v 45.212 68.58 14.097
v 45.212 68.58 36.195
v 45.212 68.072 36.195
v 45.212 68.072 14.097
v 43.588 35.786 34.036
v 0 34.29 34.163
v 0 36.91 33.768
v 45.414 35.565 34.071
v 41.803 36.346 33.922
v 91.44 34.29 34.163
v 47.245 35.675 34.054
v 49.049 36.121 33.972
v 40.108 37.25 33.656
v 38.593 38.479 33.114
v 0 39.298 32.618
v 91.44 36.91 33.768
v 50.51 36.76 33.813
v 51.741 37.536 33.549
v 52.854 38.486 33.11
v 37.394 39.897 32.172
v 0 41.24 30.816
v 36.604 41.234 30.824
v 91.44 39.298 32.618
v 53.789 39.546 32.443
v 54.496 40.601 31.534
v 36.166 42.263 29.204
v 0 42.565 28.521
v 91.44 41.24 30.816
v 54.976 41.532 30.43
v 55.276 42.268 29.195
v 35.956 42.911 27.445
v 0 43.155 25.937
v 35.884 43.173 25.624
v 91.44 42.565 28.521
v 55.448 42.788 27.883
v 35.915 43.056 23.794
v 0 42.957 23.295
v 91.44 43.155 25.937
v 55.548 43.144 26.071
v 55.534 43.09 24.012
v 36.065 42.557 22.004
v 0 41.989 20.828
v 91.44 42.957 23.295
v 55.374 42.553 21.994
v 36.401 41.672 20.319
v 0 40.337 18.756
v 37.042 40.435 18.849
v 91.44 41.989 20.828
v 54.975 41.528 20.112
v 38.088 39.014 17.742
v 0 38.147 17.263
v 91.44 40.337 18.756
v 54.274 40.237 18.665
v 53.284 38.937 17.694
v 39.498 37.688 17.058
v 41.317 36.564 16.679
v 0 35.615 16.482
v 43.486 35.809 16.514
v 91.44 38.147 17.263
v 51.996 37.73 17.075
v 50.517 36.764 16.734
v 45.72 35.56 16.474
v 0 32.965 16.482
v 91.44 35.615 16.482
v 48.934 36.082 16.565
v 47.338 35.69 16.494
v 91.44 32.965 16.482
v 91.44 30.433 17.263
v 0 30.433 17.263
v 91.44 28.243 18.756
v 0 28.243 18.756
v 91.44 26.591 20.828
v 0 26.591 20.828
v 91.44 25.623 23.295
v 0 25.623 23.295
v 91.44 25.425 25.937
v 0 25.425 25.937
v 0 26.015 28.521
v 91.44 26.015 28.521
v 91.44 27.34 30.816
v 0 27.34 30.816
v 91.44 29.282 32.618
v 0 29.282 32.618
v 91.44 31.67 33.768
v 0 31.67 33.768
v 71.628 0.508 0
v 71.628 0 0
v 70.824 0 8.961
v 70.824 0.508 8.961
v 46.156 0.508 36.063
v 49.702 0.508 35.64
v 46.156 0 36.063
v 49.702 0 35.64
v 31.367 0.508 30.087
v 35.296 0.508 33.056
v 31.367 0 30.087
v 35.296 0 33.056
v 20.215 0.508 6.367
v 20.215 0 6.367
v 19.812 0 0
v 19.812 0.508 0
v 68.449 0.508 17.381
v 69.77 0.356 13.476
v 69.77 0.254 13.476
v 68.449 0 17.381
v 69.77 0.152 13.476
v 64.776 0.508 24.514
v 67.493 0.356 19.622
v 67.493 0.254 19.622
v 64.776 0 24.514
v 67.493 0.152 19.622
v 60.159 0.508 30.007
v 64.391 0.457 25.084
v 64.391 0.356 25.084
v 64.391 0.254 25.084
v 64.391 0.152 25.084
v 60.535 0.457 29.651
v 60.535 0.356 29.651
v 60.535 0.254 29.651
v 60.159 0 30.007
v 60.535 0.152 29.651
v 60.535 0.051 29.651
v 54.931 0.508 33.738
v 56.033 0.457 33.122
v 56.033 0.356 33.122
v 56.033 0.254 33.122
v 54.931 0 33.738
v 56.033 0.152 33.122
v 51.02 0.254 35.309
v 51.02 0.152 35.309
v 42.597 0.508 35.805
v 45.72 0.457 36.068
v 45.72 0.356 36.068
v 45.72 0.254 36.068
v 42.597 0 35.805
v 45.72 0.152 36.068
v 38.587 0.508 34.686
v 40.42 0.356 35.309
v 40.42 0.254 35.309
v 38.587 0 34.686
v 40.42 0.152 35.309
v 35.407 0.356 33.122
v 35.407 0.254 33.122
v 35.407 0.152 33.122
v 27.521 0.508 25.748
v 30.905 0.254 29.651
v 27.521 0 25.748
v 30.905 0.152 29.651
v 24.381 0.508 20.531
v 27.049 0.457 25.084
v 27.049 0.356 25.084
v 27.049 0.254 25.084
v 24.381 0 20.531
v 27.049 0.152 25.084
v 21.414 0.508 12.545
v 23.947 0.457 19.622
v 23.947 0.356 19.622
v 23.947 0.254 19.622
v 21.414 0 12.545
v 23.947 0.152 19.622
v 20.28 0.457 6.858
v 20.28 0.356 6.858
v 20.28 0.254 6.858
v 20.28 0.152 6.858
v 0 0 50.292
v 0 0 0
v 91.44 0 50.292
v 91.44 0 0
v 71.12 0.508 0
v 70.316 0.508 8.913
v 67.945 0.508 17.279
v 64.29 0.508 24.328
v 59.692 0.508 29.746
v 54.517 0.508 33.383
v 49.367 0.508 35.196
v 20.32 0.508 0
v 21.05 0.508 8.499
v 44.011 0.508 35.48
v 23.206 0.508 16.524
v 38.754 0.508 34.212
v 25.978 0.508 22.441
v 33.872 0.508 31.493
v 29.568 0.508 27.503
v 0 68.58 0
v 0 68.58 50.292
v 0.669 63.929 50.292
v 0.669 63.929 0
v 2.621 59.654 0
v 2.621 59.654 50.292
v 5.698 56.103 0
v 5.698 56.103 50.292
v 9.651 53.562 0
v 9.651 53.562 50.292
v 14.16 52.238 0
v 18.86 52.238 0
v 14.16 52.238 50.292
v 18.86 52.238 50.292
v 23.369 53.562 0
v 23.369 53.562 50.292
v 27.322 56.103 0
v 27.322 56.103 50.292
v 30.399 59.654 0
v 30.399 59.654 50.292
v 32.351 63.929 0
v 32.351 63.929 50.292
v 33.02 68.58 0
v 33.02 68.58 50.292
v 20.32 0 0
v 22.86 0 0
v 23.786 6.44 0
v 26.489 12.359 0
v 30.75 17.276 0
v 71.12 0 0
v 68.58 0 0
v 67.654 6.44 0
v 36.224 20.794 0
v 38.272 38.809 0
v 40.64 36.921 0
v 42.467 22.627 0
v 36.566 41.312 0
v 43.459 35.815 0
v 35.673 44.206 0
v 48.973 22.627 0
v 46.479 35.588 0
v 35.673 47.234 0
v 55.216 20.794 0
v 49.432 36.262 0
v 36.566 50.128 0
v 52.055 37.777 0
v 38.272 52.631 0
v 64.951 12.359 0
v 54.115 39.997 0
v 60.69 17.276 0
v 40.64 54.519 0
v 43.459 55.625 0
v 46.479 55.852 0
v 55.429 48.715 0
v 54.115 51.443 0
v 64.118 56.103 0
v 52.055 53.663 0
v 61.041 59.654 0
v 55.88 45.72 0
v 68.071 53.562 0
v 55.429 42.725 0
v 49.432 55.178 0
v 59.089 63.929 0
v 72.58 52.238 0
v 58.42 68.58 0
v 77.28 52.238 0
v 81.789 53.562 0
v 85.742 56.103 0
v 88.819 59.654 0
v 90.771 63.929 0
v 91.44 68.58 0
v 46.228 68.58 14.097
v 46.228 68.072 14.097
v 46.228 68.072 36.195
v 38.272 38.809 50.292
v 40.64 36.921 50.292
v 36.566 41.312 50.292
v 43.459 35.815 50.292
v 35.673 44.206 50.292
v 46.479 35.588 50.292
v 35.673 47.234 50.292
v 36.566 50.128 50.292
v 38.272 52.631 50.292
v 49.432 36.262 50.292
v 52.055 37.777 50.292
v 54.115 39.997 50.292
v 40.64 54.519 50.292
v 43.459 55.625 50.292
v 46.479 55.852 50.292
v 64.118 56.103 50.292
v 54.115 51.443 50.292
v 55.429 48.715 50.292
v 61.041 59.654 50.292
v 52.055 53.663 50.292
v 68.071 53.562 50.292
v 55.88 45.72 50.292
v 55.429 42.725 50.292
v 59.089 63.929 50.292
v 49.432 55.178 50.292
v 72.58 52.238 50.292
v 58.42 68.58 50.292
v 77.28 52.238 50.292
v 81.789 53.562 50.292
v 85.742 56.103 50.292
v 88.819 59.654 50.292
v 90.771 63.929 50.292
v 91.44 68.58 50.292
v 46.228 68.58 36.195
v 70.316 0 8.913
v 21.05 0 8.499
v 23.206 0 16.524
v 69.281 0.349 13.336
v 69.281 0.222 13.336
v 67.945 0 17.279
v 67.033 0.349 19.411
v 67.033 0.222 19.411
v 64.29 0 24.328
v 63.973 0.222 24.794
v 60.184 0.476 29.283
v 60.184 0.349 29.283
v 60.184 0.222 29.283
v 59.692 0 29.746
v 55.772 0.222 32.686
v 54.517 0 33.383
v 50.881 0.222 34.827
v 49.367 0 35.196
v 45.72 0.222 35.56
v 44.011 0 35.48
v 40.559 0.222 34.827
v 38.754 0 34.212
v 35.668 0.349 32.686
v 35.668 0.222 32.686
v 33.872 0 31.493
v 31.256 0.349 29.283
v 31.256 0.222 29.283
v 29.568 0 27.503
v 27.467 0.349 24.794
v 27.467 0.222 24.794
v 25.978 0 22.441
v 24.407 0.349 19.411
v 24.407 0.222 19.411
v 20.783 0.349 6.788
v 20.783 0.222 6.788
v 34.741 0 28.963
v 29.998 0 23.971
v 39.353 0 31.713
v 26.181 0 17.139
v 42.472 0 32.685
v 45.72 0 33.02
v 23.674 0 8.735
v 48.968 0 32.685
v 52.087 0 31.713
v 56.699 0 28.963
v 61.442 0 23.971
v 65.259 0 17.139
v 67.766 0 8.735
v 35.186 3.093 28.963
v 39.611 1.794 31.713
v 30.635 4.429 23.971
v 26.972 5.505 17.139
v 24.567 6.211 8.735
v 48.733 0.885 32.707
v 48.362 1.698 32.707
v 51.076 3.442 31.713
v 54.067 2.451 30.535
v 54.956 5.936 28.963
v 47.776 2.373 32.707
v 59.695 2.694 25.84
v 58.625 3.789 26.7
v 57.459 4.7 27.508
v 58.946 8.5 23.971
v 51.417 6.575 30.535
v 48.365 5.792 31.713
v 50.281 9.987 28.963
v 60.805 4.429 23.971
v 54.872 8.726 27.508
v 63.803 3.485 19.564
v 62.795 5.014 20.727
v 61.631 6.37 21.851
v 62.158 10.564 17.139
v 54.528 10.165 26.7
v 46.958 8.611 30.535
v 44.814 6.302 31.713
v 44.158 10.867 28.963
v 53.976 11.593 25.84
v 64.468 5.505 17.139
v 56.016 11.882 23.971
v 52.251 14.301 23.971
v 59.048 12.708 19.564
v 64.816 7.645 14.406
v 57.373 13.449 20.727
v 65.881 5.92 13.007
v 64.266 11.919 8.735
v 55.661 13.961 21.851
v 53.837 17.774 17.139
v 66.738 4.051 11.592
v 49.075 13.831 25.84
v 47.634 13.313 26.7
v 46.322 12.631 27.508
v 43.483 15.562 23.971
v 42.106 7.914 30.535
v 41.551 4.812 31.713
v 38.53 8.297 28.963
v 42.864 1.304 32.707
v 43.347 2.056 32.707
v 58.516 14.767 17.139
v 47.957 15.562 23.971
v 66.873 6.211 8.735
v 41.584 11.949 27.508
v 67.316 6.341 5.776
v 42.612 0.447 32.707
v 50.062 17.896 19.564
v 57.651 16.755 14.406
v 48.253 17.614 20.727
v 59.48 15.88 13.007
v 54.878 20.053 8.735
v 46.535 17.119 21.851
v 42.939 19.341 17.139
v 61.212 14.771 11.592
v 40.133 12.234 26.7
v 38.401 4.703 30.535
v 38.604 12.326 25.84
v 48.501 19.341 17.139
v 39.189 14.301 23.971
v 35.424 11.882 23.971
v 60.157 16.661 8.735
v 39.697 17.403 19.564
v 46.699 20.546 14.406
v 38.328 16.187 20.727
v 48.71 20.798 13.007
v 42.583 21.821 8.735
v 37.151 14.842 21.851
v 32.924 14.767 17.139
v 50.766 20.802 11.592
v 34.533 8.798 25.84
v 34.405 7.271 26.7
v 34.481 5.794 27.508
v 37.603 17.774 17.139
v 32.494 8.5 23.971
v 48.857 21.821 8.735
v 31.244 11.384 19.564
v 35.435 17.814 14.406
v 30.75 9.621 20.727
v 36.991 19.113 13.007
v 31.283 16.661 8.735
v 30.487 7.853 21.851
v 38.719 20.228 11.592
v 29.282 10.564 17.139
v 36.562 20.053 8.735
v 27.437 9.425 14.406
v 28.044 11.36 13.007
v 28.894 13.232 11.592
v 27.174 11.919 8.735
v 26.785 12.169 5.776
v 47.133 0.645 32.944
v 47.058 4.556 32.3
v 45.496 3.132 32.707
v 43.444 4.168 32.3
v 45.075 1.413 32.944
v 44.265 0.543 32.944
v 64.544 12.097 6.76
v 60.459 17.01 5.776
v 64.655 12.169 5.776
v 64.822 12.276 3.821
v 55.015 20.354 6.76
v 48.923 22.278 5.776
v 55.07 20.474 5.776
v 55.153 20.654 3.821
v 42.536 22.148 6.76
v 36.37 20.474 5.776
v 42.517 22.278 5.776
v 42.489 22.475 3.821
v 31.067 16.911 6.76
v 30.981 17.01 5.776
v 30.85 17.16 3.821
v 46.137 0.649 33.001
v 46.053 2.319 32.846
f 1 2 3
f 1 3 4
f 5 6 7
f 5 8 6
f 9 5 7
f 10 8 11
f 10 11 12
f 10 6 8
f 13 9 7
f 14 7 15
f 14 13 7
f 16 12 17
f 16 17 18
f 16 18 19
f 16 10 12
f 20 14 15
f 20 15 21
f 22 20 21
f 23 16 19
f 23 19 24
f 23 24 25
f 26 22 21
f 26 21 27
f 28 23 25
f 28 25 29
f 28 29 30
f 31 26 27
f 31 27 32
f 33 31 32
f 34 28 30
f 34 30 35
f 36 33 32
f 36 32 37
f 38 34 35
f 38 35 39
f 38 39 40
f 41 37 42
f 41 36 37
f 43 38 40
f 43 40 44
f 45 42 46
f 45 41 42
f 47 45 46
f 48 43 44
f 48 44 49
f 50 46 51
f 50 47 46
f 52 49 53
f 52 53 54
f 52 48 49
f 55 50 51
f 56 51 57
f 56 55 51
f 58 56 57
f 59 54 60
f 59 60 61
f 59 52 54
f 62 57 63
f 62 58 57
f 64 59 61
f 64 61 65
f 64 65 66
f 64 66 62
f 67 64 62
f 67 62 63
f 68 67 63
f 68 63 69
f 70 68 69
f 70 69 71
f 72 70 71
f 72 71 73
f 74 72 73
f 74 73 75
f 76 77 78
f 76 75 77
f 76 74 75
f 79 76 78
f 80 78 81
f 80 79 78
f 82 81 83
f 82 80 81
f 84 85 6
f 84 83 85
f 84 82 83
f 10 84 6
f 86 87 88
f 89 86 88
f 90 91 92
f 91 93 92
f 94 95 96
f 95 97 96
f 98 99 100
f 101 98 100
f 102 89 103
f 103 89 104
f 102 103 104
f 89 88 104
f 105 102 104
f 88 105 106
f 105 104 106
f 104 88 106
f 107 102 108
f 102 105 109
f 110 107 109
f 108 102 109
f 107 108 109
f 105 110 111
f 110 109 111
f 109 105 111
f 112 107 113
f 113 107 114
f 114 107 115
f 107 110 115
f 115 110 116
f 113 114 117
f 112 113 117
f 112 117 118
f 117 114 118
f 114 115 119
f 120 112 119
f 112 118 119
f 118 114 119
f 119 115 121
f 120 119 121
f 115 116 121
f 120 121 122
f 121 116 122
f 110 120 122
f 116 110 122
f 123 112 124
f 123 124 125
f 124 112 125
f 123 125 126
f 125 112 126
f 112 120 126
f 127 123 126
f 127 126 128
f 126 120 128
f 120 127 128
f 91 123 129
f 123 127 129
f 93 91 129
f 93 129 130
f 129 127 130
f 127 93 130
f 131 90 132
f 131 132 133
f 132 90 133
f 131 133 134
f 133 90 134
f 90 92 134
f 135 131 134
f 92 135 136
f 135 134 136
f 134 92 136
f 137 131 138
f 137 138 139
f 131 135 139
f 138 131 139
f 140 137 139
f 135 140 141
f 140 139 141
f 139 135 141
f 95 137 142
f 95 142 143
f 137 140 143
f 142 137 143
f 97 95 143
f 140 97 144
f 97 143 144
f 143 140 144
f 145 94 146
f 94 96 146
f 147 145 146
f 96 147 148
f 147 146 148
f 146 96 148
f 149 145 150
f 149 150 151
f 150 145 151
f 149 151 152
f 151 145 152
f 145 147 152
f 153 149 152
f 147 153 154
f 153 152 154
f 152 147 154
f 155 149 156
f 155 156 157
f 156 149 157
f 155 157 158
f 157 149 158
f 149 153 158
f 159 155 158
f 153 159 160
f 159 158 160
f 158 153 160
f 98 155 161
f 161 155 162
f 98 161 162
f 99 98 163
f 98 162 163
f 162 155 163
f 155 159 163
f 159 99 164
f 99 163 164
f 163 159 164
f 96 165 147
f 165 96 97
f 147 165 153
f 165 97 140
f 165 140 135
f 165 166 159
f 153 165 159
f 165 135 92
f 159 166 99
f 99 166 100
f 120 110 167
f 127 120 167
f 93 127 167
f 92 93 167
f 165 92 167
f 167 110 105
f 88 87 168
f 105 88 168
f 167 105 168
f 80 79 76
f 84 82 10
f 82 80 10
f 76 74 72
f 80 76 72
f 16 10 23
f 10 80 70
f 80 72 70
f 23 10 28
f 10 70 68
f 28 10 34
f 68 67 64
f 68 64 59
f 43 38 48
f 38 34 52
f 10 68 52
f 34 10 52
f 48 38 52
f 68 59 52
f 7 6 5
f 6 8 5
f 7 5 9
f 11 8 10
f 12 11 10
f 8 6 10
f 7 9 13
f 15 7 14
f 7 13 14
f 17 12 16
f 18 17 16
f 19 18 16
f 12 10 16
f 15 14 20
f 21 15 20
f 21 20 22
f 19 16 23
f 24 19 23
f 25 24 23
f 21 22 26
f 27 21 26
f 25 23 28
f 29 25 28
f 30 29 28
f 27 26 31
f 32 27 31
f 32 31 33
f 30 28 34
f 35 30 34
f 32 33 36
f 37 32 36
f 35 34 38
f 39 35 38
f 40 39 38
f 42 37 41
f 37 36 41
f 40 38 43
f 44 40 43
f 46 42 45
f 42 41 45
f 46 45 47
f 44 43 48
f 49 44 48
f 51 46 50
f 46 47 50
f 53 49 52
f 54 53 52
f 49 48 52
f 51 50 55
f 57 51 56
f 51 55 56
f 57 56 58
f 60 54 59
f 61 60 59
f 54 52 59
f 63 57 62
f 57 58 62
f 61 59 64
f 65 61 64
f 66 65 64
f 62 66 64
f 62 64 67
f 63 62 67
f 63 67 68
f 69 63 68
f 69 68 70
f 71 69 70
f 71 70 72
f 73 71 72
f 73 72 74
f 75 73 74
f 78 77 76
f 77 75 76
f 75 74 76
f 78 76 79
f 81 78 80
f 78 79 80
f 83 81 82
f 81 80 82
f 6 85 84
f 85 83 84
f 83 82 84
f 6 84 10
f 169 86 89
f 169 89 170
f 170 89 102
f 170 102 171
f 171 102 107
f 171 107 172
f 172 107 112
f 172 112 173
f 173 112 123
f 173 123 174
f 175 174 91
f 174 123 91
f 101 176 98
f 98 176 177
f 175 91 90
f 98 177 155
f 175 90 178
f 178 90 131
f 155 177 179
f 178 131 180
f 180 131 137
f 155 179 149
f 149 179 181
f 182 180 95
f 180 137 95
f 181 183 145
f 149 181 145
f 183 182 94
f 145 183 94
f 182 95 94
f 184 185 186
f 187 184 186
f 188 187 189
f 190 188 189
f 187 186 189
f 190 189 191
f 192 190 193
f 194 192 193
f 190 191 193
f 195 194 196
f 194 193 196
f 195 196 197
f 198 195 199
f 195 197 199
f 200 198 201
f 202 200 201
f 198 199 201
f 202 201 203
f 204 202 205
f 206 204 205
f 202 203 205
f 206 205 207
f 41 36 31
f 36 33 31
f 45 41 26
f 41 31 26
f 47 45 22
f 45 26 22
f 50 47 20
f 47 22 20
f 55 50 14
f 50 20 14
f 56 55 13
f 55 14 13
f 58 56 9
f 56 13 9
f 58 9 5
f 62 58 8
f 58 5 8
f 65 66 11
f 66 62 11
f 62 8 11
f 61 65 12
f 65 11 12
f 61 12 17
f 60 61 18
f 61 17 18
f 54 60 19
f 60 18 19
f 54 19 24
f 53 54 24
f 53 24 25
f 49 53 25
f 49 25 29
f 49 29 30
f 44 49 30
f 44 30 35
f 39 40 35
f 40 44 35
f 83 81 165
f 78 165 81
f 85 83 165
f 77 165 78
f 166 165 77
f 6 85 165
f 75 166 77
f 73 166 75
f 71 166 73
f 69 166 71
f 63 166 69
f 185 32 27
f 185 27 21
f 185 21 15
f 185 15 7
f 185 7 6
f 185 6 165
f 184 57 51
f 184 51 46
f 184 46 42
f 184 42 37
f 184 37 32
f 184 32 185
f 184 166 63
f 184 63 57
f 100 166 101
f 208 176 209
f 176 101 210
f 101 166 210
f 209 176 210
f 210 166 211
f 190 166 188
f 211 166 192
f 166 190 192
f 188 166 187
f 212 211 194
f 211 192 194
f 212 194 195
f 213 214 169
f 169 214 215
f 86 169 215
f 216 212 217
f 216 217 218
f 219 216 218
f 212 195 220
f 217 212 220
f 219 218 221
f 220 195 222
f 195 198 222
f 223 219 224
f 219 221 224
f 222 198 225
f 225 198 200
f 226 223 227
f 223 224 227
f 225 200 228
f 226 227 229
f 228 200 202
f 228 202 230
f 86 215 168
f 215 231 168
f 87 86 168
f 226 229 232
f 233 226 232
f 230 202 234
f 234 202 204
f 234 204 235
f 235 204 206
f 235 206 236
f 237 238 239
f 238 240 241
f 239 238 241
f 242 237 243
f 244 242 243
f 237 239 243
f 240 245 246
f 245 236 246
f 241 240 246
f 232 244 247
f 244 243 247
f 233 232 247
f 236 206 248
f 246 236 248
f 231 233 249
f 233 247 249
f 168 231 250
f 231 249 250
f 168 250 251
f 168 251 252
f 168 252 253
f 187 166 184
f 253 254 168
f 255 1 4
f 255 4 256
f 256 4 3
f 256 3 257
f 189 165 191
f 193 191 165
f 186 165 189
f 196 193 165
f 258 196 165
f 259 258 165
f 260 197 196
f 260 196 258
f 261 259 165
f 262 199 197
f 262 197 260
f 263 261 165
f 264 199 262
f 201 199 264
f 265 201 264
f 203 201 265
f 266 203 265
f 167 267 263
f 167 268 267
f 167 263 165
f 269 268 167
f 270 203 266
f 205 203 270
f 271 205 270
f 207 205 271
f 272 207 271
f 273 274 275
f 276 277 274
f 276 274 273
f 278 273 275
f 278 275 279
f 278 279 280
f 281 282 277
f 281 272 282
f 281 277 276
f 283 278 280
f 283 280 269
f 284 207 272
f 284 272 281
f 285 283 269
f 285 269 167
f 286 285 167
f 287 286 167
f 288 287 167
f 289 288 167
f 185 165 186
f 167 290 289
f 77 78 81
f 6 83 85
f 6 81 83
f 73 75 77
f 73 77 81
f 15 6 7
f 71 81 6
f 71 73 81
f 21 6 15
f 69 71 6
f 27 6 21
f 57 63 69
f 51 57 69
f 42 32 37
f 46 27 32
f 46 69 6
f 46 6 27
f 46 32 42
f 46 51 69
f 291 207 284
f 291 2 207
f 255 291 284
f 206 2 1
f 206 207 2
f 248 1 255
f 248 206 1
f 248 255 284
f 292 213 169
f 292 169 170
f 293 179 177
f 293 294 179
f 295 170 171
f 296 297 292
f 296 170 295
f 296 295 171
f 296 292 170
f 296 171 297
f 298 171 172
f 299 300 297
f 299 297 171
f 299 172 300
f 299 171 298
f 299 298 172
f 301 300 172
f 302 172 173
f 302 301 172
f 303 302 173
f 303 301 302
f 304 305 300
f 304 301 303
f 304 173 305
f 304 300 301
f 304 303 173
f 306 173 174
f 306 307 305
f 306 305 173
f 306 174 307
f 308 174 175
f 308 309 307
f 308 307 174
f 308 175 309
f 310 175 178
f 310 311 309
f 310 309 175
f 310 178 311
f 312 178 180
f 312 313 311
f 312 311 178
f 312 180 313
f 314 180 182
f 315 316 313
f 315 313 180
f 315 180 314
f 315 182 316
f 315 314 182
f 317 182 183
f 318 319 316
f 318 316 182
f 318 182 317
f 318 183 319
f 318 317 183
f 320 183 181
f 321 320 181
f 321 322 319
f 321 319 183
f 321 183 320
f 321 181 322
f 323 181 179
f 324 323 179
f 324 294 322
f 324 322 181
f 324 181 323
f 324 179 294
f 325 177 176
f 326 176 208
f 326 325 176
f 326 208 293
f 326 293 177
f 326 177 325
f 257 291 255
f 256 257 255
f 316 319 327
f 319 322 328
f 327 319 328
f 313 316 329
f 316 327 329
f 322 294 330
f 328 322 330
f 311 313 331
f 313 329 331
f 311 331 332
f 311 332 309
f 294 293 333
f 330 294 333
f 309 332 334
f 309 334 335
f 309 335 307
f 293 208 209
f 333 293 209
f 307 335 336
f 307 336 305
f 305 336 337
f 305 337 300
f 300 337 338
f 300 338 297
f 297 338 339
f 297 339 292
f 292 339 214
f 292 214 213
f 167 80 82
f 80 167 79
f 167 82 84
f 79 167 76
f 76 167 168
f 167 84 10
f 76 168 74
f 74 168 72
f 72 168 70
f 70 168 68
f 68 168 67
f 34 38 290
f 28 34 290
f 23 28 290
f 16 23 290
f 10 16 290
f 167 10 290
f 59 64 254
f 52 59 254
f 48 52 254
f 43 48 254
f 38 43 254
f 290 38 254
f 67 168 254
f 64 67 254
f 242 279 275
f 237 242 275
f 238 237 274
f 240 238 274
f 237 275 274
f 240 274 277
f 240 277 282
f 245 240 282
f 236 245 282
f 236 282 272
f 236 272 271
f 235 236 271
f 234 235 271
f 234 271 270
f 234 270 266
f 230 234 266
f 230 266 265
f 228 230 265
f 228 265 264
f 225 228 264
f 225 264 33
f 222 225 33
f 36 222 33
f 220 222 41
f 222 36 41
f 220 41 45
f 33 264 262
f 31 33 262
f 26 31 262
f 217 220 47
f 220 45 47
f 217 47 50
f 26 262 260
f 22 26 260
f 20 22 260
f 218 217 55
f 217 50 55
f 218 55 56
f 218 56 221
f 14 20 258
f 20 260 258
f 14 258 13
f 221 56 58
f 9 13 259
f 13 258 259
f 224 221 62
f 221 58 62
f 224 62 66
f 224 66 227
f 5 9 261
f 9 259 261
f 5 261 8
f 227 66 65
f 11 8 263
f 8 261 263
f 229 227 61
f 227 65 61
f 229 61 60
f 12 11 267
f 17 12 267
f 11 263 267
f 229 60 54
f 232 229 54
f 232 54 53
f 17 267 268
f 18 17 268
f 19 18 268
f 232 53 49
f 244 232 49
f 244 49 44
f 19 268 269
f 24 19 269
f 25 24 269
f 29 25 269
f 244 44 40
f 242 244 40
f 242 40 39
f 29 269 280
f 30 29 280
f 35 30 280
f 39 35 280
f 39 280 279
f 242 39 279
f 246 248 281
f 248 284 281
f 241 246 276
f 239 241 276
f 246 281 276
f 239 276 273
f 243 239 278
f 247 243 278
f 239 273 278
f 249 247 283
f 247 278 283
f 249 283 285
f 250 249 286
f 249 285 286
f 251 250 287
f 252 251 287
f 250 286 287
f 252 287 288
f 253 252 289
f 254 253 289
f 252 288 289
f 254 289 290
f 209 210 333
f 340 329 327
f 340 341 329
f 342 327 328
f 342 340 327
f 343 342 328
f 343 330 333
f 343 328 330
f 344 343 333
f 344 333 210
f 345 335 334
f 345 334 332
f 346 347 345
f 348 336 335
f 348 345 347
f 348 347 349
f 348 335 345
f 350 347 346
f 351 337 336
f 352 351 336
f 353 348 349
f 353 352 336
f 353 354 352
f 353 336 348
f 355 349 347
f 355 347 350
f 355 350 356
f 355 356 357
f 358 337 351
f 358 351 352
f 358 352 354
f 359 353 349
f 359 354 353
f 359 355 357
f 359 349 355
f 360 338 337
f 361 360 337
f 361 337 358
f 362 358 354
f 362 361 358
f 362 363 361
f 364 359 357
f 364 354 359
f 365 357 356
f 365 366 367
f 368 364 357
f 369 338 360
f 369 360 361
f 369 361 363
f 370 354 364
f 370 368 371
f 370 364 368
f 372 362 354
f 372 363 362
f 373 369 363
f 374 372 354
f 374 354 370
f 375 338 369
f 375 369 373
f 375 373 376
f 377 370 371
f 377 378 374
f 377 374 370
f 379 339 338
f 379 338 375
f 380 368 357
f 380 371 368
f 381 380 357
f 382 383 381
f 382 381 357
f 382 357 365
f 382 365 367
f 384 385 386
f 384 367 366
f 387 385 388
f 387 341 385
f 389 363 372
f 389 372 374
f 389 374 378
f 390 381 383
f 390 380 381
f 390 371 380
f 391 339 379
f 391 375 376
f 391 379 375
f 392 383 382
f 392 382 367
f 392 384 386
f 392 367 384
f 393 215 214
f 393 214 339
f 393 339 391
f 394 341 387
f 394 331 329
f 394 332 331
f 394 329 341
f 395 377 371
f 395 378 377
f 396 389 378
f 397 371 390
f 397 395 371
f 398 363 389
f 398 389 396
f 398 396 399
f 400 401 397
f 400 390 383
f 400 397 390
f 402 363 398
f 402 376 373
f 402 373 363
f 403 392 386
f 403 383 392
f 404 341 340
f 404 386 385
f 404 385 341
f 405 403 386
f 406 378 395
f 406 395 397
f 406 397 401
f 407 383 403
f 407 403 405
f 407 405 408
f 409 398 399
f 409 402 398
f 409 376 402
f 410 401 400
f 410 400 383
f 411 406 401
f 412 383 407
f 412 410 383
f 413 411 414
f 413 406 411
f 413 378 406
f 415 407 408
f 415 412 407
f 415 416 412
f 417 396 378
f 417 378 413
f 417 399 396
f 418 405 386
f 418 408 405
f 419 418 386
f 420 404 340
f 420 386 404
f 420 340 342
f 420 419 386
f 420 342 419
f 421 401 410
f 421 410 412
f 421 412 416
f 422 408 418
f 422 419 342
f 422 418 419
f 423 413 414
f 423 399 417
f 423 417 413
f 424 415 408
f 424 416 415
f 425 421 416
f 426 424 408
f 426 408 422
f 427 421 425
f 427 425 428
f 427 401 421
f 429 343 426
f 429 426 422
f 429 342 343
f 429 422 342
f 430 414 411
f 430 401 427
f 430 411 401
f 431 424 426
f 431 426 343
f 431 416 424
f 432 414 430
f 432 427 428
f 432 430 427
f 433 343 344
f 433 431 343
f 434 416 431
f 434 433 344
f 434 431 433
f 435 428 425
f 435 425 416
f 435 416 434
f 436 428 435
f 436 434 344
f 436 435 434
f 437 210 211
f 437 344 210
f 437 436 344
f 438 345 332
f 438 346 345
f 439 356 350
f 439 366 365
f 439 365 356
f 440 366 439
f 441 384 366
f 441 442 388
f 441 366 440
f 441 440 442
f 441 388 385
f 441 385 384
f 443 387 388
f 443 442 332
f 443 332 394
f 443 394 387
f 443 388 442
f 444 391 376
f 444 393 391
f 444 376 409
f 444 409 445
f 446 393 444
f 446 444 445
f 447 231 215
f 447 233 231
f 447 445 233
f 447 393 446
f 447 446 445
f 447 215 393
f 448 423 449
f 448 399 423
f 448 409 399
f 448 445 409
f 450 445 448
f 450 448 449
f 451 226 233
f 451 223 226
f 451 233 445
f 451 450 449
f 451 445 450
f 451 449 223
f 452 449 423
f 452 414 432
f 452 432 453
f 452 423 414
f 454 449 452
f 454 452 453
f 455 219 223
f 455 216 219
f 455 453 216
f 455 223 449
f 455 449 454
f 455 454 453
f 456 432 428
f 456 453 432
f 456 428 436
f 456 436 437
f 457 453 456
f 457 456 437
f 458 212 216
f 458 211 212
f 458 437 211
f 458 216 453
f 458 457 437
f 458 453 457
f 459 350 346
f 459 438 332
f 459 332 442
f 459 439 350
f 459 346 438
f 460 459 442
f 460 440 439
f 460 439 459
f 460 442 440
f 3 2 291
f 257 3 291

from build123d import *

# Parameters (mm, degrees)
SKETCH1_W              = 91.44
SKETCH1_H              = 68.58
BOSS_EXTRUDE1_DEPTH    = 50.292
SKETCH2_R              = 16.51
CUT_EXTRUDE1_DEPTH     = 125.875038595
SKETCH3_R              = 10.16
CUT_EXTRUDE2_DEPTH     = 125.875038595
SKETCH15_W             = 1.016
SKETCH15_H             = 22.098
CUT_EXTRUDE4_DEPTH     = 0.508
SPLIT1_SURFACE_1_BACK  = 125.875
SPLIT1_SURFACE_1_DEPTH = 251.75
SPLIT1_SURFACE_2_BACK  = 125.875
SPLIT1_SURFACE_2_DEPTH = 251.75
CUT_EXTRUDE3_DEPTH     = 0.508


with BuildPart() as part:
    # Sketch1 → Boss-Extrude1 (new body)
    with BuildSketch(Plane.XY):
        with Locations((45.72, 34.29)):
            Rectangle(SKETCH1_W, SKETCH1_H)
    extrude(amount=BOSS_EXTRUDE1_DEPTH)

    # Sketch2 → Cut-Extrude1 (cut, through all)
    with BuildSketch(Plane.XY.offset(50.292)):
        with Locations((16.51, 68.58)):
            Circle(SKETCH2_R)
        with Locations((74.93, 68.58)):
            Circle(SKETCH2_R)
    extrude(amount=-CUT_EXTRUDE1_DEPTH, mode=Mode.SUBTRACT)

    # Sketch3 → Cut-Extrude2 (cut, through all)
    with BuildSketch(Plane.XY.offset(50.292)):
        with Locations((45.72, 45.72)):
            Circle(SKETCH3_R)
    extrude(amount=-CUT_EXTRUDE2_DEPTH, mode=Mode.SUBTRACT)

    # Sketch11 → Cut-Revolve1 (revolve, cut)
    with BuildSketch(Plane.ZY.offset(-45.72)):
        with BuildLine():
            Line((0, 0), (33.02, 0))
            add(Edge.make_bspline(
                [(33.02, 0), (33.02, 22.86), (0, 22.86)],
                knots=[3.141592654, 3.141592654, 3.141592654, 4.71238898, 4.71238898, 4.71238898], degree=2, weights=[1, 0.707106781, 1]))
            Line((0, 22.86), (0, 0))
        make_face()
    revolve(axis=Axis((45.72, 0, 0), (0, 0, 1)), mode=Mode.SUBTRACT)

    # Sketch15 → Cut-Extrude4 (cut)
    with BuildSketch(Plane(origin=(0, 68.58, 0), x_dir=(1, 0, 0), z_dir=(0, 1, 0))):
        with Locations((45.72, -25.146)):
            Rectangle(SKETCH15_W, SKETCH15_H)
    extrude(amount=-CUT_EXTRUDE4_DEPTH, mode=Mode.SUBTRACT)


with BuildPart() as body_2:
    # Split1: the piece behind the surface
    add(part.part)
    # Split1 surface: a surface, the sketch's curves swept straight by 251.75 mm
    with BuildLine(Plane.ZY.offset(-SPLIT1_SURFACE_1_BACK), mode=Mode.PRIVATE) as split1_surface_1_path:
        CenterArc((25.273, 34.29), 8.89, 0, 360)
    split1_surface_1 = Shell.extrude(split1_surface_1_path.wire(), (-1 * SPLIT1_SURFACE_1_DEPTH, 0 * SPLIT1_SURFACE_1_DEPTH, 0 * SPLIT1_SURFACE_1_DEPTH))
    split(bisect_by=split1_surface_1, keep=Keep.BOTTOM)

    # Sketch12 → Cut-Extrude3 (cut)
    with BuildSketch(Plane.XZ):
        with BuildLine():
            Line((71.628, 0), (71.12, 0))
            add(Edge.make_bspline(
                [(71.12, 0), (71.12, 2.276244985), (70.964914115, 4.552443767), (70.349095665, 9.024340369), (69.888388082, 11.219955291), (68.674570464, 15.452776891), (67.921501402, 17.489932253), (66.143884943, 21.332719306), (65.119361513, 23.13835701), (62.826296857, 26.450561512), (61.55767782, 27.957189939), (58.810832755, 30.608298997), (57.332320888, 31.752755749), (54.212180089, 33.619562445), (52.570236556, 34.341466449), (49.192113285, 35.312061611), (47.456311718, 35.56), (45.72, 35.56)],
                knots=[0, 0, 0, 0, 0.125, 0.125, 0.25, 0.25, 0.375, 0.375, 0.5, 0.5, 0.625, 0.625, 0.75, 0.75, 0.875, 0.875, 1, 1, 1, 1], degree=3))
            add(Edge.make_bspline(
                [(45.72, 35.56), (43.983688282, 35.56), (42.247886715, 35.312061611), (38.869763444, 34.341466449), (37.227819911, 33.619562445), (34.107679112, 31.752755749), (32.629167245, 30.608298997), (29.88232218, 27.957189939), (28.613703143, 26.450561512), (26.320638487, 23.13835701), (25.296115057, 21.332719306), (23.518498598, 17.489932253), (22.765429536, 15.452776891), (21.551611918, 11.219955291), (21.090904335, 9.024340369), (20.475085885, 4.552443767), (20.32, 2.276244985), (20.32, 0)],
                knots=[0, 0, 0, 0, 0.125, 0.125, 0.25, 0.25, 0.375, 0.375, 0.5, 0.5, 0.625, 0.625, 0.75, 0.75, 0.875, 0.875, 1, 1, 1, 1], degree=3))
            Line((20.32, 0), (19.812, 0))
            add(Edge.make_bspline(
                [(45.72, 36.068), (42.144810252, 36.068), (35.052039646, 33.985545585), (26.542214261, 25.681133353), (21.987107711, 15.773212712), (20.125369552, 6.901184214), (19.812, 2.291209088), (19.812, 0)],
                knots=[0, 0, 0, 0, 0.25, 0.5, 0.75, 0.875, 1, 1, 1, 1], degree=3))
            add(Edge.make_bspline(
                [(71.628, 0), (71.628, 2.291209088), (71.314630448, 6.901184214), (69.452892289, 15.773212712), (64.897785739, 25.681133353), (56.387960354, 33.985545585), (49.295189748, 36.068), (45.72, 36.068)],
                knots=[0, 0, 0, 0, 0.125, 0.25, 0.5, 0.75, 1, 1, 1, 1], degree=3))
        make_face()
    extrude(amount=-CUT_EXTRUDE3_DEPTH, mode=Mode.SUBTRACT)


with BuildPart() as part_1:
    add(part.part)

    # Split1: split by a surface, the side it looks to stays
    # Split1 surface: a surface, the sketch's curves swept straight by 251.75 mm
    with BuildLine(Plane.ZY.offset(-SPLIT1_SURFACE_2_BACK), mode=Mode.PRIVATE) as split1_surface_2_path:
        CenterArc((25.273, 34.29), 8.89, 0, 360)
    split1_surface_2 = Shell.extrude(split1_surface_2_path.wire(), (-1 * SPLIT1_SURFACE_2_DEPTH, 0 * SPLIT1_SURFACE_2_DEPTH, 0 * SPLIT1_SURFACE_2_DEPTH))
    split(bisect_by=split1_surface_2, keep=Keep.TOP)


solid = Compound([body_2.part, part_1.part])
